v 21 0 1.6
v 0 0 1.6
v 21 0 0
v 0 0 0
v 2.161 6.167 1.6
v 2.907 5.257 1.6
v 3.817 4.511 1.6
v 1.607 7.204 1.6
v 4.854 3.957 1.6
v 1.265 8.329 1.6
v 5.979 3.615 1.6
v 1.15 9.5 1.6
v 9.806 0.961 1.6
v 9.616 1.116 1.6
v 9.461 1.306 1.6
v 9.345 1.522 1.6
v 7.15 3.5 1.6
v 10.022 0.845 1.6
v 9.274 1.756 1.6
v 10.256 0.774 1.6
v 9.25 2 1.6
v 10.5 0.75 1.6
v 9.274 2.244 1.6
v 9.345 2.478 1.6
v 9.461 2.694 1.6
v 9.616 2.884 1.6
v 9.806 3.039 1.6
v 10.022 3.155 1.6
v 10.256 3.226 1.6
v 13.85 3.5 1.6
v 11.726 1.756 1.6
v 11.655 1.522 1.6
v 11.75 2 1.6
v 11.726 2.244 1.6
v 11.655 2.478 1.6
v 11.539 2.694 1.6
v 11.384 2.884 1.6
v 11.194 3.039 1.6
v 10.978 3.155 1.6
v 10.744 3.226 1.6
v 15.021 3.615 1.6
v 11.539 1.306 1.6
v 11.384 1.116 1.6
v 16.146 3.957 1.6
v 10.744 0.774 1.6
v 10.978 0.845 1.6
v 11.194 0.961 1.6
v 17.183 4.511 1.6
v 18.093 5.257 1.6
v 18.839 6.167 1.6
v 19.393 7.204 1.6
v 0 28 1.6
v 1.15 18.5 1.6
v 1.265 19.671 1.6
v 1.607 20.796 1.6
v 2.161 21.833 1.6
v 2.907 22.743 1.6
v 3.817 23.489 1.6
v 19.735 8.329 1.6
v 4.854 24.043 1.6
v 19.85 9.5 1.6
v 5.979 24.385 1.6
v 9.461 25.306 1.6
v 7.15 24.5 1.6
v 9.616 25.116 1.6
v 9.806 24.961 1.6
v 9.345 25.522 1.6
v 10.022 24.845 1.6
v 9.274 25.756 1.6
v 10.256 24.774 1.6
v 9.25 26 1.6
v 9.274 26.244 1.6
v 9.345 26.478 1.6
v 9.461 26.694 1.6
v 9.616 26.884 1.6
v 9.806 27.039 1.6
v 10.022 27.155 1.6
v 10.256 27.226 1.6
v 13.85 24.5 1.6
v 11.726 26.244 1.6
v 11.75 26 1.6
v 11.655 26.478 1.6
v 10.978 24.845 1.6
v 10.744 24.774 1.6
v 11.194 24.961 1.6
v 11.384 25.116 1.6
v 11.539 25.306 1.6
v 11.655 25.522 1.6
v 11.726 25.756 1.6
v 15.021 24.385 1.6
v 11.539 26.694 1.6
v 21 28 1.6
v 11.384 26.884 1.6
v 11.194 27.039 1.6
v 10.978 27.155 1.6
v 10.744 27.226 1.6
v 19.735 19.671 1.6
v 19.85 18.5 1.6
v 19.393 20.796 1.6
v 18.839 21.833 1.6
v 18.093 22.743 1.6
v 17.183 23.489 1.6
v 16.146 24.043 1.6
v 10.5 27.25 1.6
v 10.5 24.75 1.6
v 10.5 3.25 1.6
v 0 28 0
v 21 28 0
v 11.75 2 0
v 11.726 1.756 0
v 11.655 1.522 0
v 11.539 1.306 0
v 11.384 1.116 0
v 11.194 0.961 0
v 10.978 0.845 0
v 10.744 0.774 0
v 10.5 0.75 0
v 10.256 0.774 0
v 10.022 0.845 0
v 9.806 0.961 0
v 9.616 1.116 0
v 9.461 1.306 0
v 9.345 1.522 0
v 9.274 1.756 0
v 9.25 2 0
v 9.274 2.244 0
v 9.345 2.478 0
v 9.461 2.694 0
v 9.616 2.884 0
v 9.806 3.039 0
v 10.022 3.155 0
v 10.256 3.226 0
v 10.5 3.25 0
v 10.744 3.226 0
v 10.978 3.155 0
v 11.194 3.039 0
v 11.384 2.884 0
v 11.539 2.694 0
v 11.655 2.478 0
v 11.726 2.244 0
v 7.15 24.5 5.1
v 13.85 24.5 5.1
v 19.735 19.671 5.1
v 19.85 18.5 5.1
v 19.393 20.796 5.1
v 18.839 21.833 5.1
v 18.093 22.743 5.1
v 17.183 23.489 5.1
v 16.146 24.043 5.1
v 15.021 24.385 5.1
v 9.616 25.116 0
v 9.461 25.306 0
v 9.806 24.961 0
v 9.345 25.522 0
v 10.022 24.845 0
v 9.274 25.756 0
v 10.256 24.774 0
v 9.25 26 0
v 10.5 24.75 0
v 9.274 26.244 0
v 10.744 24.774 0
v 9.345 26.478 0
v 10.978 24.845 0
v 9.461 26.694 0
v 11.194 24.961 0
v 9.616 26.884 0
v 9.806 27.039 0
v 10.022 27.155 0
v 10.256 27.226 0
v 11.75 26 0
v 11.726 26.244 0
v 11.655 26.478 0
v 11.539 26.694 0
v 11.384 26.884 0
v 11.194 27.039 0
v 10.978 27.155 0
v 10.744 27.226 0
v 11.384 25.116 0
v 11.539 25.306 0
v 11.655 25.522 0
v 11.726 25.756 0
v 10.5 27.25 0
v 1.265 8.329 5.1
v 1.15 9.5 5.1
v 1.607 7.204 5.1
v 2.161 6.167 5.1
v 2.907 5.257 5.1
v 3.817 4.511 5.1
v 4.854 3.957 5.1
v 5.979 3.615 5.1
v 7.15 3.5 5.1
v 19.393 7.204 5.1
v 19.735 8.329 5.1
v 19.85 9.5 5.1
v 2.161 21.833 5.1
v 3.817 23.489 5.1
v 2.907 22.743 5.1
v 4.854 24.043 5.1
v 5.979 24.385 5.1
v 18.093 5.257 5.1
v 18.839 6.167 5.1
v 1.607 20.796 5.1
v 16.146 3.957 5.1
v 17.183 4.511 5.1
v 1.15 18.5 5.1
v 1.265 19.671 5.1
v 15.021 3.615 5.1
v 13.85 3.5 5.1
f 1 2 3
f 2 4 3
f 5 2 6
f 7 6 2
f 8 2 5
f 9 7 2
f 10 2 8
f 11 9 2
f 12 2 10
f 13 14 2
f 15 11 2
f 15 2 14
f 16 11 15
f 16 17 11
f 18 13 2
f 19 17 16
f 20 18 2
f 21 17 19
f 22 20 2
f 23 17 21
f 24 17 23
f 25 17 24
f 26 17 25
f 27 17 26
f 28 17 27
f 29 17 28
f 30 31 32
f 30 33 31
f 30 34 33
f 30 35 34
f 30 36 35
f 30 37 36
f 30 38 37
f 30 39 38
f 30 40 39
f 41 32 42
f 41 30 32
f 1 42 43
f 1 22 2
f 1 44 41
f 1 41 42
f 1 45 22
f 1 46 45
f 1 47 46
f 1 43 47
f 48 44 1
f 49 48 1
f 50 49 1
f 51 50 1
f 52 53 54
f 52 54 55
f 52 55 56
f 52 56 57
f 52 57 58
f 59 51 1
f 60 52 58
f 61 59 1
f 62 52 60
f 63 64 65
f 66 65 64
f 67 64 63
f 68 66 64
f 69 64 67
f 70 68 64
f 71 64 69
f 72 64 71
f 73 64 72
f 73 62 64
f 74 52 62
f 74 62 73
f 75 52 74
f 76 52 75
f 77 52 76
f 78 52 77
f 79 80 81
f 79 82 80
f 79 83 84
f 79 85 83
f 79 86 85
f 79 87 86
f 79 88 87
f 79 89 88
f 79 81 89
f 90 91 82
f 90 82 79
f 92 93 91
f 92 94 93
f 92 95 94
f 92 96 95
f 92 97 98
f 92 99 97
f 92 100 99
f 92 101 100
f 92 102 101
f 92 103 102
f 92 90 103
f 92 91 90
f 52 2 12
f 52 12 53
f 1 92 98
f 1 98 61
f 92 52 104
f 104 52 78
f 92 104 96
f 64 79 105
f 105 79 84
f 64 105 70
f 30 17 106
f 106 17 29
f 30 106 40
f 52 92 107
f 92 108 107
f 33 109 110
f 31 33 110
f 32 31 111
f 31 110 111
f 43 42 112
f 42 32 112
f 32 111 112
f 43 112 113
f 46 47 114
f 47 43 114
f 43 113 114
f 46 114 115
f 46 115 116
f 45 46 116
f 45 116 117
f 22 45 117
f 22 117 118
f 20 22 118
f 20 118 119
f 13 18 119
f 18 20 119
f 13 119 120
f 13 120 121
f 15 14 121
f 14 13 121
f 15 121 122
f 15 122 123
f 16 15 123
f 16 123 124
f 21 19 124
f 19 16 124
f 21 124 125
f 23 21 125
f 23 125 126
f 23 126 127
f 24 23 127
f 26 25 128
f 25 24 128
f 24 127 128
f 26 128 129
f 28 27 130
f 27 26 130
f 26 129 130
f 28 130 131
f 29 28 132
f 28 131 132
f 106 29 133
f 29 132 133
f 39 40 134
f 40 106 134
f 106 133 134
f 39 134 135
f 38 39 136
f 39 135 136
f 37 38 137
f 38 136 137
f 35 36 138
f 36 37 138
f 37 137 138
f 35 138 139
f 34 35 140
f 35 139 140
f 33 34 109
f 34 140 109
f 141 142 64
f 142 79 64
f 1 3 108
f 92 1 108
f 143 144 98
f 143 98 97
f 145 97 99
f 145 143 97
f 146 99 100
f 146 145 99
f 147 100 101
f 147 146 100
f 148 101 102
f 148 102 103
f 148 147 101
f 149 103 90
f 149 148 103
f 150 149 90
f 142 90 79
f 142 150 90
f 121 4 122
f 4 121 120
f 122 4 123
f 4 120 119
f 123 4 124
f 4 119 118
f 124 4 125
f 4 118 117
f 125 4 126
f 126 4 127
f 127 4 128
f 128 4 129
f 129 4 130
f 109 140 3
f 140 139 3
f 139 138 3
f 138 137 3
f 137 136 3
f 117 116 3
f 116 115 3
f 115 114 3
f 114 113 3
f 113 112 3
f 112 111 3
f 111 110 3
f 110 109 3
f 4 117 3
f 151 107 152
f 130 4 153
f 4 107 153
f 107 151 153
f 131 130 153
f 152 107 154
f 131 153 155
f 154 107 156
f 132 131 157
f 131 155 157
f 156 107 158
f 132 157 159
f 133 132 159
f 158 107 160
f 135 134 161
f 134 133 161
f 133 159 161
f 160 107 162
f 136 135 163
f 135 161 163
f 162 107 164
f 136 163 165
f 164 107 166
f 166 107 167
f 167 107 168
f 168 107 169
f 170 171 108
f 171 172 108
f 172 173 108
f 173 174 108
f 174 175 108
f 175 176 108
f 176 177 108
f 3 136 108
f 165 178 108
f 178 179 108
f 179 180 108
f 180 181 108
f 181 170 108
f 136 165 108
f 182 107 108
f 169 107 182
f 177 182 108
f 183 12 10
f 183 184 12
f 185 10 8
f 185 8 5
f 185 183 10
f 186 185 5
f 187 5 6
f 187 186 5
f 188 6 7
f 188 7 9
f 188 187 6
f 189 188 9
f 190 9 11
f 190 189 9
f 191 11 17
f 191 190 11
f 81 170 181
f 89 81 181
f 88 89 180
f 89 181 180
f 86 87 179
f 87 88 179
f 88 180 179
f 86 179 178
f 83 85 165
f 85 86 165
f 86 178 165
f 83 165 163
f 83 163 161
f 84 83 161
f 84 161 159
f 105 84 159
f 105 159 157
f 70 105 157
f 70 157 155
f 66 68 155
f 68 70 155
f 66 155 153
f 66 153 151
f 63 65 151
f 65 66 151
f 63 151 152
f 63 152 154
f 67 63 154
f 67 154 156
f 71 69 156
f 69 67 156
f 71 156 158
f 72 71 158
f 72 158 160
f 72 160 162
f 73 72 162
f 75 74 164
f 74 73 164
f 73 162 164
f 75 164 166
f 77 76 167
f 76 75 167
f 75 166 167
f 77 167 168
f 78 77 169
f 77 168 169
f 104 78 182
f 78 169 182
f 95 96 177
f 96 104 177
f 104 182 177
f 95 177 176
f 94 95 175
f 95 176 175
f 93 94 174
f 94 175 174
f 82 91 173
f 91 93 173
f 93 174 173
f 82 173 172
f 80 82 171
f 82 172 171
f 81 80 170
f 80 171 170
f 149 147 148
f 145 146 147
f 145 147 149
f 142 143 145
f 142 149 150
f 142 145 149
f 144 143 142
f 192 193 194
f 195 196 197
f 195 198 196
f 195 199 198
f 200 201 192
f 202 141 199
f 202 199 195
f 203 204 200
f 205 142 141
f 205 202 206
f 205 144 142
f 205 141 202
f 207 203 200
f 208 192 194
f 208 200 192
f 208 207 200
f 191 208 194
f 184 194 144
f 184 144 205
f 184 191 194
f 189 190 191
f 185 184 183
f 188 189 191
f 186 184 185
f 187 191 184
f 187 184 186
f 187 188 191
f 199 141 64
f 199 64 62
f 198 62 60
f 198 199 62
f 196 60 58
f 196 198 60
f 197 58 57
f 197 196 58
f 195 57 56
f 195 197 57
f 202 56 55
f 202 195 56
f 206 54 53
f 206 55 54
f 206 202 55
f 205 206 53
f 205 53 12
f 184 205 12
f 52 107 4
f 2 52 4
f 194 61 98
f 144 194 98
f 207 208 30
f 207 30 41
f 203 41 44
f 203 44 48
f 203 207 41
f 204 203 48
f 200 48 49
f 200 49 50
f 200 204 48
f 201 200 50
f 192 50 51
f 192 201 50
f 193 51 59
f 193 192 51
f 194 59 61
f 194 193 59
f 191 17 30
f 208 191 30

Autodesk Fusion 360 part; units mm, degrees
sketch "Sketch1" plane through (0, 0, 0) normal (0, 0, 1) x (1, 0, 0)
  line L0 (0, 0) -> (0, 28) construction
  line L1 (0, 28) -> (21, 28) construction
  line L2 (21, 28) -> (0, 28) construction
  line L3 (0, 28) -> (0, 0) construction
  line L4 (0, 0) -> (21, 0) construction
  line L5 (21, 0) -> (21, 28) construction
  line L6 (10.5, 0) -> (10.5, 28) construction
  line L7 (10.5, 0) -> (10.5, 2) construction
  line L8 (10.5, 28) -> (10.5, 26) construction
  circle A0 centre (10.5, 26) radius 1.25 construction
  circle A1 centre (10.5, 2) radius 1.25 construction
  line L9 (21, 28) -> (0, 28)
  line L10 (0, 28) -> (0, 0)
  line L11 (0, 0) -> (21, 0)
  line L12 (21, 0) -> (21, 28)
  circle A2 centre (10.5, 2) radius 1.25
  circle A3 centre (10.5, 26) radius 1.25
  dimension "d38" = 28
  dimension "d39" = 21
  dimension "d40" = 2
  dimension "d41" = 2
  dimension "d42" = 2.5
  dimension "d43" = 2.5
extrude "Extrude1" add sketch "Sketch1" along normal blind 1.6
sketch "Sketch2" plane through (0, 0, 1.6) normal (0, 0, 1) x (-1, 0, 0)
  circle A0 centre (-10.5, -26) radius 1.25
  circle A1 centre (-10.5, -2) radius 1.25
  line L0 (-21, 0) -> (-21, -28)
  line L1 (-21, -28) -> (0, -28)
  line L2 (0, -28) -> (0, 0)
  line L3 (0, 0) -> (-21, 0)
  line L4 (0, -14) -> (-21, -14) construction
  line L5 (-10.5, -28) -> (-10.5, 0) construction
  line L6 (-10.5, -14) -> (-10.5, -24.5) construction
  line L7 (-10.5, -24.5) -> (-19.85, -24.5) construction
  line L8 (-10.5, -14) -> (-10.5, -3.5) construction
  line L9 (-10.5, -3.5) -> (-1.15, -3.5) construction
  line L10 (-1.15, -3.5) -> (-19.85, -3.5) construction
  line L11 (-19.85, -3.5) -> (-19.85, -24.5) construction
  line L12 (-19.85, -24.5) -> (-1.15, -24.5) construction
  line L13 (-1.15, -24.5) -> (-1.15, -3.5) construction
  line L14 (-1.15, -3.5) -> (-19.85, -3.5)
  line L15 (-19.85, -3.5) -> (-19.85, -24.5)
  line L16 (-19.85, -24.5) -> (-1.15, -24.5)
  line L17 (-1.15, -24.5) -> (-1.15, -3.5)
  dimension "d46" = 10.5
  dimension "d47" = 9.35
  dimension "d48" = 10.5
  dimension "d49" = 9.35
extrude "Extrude2" add sketch "Sketch2" along normal blind 3.5 contours L14 L15 L16 L17
fillet "Fillet1" radius 6 4 edges at (19.85, 3.5, 3.35) (1.15, 3.5, 3.35) (1.15, 24.5, 3.35) (19.85, 24.5, 3.35)
